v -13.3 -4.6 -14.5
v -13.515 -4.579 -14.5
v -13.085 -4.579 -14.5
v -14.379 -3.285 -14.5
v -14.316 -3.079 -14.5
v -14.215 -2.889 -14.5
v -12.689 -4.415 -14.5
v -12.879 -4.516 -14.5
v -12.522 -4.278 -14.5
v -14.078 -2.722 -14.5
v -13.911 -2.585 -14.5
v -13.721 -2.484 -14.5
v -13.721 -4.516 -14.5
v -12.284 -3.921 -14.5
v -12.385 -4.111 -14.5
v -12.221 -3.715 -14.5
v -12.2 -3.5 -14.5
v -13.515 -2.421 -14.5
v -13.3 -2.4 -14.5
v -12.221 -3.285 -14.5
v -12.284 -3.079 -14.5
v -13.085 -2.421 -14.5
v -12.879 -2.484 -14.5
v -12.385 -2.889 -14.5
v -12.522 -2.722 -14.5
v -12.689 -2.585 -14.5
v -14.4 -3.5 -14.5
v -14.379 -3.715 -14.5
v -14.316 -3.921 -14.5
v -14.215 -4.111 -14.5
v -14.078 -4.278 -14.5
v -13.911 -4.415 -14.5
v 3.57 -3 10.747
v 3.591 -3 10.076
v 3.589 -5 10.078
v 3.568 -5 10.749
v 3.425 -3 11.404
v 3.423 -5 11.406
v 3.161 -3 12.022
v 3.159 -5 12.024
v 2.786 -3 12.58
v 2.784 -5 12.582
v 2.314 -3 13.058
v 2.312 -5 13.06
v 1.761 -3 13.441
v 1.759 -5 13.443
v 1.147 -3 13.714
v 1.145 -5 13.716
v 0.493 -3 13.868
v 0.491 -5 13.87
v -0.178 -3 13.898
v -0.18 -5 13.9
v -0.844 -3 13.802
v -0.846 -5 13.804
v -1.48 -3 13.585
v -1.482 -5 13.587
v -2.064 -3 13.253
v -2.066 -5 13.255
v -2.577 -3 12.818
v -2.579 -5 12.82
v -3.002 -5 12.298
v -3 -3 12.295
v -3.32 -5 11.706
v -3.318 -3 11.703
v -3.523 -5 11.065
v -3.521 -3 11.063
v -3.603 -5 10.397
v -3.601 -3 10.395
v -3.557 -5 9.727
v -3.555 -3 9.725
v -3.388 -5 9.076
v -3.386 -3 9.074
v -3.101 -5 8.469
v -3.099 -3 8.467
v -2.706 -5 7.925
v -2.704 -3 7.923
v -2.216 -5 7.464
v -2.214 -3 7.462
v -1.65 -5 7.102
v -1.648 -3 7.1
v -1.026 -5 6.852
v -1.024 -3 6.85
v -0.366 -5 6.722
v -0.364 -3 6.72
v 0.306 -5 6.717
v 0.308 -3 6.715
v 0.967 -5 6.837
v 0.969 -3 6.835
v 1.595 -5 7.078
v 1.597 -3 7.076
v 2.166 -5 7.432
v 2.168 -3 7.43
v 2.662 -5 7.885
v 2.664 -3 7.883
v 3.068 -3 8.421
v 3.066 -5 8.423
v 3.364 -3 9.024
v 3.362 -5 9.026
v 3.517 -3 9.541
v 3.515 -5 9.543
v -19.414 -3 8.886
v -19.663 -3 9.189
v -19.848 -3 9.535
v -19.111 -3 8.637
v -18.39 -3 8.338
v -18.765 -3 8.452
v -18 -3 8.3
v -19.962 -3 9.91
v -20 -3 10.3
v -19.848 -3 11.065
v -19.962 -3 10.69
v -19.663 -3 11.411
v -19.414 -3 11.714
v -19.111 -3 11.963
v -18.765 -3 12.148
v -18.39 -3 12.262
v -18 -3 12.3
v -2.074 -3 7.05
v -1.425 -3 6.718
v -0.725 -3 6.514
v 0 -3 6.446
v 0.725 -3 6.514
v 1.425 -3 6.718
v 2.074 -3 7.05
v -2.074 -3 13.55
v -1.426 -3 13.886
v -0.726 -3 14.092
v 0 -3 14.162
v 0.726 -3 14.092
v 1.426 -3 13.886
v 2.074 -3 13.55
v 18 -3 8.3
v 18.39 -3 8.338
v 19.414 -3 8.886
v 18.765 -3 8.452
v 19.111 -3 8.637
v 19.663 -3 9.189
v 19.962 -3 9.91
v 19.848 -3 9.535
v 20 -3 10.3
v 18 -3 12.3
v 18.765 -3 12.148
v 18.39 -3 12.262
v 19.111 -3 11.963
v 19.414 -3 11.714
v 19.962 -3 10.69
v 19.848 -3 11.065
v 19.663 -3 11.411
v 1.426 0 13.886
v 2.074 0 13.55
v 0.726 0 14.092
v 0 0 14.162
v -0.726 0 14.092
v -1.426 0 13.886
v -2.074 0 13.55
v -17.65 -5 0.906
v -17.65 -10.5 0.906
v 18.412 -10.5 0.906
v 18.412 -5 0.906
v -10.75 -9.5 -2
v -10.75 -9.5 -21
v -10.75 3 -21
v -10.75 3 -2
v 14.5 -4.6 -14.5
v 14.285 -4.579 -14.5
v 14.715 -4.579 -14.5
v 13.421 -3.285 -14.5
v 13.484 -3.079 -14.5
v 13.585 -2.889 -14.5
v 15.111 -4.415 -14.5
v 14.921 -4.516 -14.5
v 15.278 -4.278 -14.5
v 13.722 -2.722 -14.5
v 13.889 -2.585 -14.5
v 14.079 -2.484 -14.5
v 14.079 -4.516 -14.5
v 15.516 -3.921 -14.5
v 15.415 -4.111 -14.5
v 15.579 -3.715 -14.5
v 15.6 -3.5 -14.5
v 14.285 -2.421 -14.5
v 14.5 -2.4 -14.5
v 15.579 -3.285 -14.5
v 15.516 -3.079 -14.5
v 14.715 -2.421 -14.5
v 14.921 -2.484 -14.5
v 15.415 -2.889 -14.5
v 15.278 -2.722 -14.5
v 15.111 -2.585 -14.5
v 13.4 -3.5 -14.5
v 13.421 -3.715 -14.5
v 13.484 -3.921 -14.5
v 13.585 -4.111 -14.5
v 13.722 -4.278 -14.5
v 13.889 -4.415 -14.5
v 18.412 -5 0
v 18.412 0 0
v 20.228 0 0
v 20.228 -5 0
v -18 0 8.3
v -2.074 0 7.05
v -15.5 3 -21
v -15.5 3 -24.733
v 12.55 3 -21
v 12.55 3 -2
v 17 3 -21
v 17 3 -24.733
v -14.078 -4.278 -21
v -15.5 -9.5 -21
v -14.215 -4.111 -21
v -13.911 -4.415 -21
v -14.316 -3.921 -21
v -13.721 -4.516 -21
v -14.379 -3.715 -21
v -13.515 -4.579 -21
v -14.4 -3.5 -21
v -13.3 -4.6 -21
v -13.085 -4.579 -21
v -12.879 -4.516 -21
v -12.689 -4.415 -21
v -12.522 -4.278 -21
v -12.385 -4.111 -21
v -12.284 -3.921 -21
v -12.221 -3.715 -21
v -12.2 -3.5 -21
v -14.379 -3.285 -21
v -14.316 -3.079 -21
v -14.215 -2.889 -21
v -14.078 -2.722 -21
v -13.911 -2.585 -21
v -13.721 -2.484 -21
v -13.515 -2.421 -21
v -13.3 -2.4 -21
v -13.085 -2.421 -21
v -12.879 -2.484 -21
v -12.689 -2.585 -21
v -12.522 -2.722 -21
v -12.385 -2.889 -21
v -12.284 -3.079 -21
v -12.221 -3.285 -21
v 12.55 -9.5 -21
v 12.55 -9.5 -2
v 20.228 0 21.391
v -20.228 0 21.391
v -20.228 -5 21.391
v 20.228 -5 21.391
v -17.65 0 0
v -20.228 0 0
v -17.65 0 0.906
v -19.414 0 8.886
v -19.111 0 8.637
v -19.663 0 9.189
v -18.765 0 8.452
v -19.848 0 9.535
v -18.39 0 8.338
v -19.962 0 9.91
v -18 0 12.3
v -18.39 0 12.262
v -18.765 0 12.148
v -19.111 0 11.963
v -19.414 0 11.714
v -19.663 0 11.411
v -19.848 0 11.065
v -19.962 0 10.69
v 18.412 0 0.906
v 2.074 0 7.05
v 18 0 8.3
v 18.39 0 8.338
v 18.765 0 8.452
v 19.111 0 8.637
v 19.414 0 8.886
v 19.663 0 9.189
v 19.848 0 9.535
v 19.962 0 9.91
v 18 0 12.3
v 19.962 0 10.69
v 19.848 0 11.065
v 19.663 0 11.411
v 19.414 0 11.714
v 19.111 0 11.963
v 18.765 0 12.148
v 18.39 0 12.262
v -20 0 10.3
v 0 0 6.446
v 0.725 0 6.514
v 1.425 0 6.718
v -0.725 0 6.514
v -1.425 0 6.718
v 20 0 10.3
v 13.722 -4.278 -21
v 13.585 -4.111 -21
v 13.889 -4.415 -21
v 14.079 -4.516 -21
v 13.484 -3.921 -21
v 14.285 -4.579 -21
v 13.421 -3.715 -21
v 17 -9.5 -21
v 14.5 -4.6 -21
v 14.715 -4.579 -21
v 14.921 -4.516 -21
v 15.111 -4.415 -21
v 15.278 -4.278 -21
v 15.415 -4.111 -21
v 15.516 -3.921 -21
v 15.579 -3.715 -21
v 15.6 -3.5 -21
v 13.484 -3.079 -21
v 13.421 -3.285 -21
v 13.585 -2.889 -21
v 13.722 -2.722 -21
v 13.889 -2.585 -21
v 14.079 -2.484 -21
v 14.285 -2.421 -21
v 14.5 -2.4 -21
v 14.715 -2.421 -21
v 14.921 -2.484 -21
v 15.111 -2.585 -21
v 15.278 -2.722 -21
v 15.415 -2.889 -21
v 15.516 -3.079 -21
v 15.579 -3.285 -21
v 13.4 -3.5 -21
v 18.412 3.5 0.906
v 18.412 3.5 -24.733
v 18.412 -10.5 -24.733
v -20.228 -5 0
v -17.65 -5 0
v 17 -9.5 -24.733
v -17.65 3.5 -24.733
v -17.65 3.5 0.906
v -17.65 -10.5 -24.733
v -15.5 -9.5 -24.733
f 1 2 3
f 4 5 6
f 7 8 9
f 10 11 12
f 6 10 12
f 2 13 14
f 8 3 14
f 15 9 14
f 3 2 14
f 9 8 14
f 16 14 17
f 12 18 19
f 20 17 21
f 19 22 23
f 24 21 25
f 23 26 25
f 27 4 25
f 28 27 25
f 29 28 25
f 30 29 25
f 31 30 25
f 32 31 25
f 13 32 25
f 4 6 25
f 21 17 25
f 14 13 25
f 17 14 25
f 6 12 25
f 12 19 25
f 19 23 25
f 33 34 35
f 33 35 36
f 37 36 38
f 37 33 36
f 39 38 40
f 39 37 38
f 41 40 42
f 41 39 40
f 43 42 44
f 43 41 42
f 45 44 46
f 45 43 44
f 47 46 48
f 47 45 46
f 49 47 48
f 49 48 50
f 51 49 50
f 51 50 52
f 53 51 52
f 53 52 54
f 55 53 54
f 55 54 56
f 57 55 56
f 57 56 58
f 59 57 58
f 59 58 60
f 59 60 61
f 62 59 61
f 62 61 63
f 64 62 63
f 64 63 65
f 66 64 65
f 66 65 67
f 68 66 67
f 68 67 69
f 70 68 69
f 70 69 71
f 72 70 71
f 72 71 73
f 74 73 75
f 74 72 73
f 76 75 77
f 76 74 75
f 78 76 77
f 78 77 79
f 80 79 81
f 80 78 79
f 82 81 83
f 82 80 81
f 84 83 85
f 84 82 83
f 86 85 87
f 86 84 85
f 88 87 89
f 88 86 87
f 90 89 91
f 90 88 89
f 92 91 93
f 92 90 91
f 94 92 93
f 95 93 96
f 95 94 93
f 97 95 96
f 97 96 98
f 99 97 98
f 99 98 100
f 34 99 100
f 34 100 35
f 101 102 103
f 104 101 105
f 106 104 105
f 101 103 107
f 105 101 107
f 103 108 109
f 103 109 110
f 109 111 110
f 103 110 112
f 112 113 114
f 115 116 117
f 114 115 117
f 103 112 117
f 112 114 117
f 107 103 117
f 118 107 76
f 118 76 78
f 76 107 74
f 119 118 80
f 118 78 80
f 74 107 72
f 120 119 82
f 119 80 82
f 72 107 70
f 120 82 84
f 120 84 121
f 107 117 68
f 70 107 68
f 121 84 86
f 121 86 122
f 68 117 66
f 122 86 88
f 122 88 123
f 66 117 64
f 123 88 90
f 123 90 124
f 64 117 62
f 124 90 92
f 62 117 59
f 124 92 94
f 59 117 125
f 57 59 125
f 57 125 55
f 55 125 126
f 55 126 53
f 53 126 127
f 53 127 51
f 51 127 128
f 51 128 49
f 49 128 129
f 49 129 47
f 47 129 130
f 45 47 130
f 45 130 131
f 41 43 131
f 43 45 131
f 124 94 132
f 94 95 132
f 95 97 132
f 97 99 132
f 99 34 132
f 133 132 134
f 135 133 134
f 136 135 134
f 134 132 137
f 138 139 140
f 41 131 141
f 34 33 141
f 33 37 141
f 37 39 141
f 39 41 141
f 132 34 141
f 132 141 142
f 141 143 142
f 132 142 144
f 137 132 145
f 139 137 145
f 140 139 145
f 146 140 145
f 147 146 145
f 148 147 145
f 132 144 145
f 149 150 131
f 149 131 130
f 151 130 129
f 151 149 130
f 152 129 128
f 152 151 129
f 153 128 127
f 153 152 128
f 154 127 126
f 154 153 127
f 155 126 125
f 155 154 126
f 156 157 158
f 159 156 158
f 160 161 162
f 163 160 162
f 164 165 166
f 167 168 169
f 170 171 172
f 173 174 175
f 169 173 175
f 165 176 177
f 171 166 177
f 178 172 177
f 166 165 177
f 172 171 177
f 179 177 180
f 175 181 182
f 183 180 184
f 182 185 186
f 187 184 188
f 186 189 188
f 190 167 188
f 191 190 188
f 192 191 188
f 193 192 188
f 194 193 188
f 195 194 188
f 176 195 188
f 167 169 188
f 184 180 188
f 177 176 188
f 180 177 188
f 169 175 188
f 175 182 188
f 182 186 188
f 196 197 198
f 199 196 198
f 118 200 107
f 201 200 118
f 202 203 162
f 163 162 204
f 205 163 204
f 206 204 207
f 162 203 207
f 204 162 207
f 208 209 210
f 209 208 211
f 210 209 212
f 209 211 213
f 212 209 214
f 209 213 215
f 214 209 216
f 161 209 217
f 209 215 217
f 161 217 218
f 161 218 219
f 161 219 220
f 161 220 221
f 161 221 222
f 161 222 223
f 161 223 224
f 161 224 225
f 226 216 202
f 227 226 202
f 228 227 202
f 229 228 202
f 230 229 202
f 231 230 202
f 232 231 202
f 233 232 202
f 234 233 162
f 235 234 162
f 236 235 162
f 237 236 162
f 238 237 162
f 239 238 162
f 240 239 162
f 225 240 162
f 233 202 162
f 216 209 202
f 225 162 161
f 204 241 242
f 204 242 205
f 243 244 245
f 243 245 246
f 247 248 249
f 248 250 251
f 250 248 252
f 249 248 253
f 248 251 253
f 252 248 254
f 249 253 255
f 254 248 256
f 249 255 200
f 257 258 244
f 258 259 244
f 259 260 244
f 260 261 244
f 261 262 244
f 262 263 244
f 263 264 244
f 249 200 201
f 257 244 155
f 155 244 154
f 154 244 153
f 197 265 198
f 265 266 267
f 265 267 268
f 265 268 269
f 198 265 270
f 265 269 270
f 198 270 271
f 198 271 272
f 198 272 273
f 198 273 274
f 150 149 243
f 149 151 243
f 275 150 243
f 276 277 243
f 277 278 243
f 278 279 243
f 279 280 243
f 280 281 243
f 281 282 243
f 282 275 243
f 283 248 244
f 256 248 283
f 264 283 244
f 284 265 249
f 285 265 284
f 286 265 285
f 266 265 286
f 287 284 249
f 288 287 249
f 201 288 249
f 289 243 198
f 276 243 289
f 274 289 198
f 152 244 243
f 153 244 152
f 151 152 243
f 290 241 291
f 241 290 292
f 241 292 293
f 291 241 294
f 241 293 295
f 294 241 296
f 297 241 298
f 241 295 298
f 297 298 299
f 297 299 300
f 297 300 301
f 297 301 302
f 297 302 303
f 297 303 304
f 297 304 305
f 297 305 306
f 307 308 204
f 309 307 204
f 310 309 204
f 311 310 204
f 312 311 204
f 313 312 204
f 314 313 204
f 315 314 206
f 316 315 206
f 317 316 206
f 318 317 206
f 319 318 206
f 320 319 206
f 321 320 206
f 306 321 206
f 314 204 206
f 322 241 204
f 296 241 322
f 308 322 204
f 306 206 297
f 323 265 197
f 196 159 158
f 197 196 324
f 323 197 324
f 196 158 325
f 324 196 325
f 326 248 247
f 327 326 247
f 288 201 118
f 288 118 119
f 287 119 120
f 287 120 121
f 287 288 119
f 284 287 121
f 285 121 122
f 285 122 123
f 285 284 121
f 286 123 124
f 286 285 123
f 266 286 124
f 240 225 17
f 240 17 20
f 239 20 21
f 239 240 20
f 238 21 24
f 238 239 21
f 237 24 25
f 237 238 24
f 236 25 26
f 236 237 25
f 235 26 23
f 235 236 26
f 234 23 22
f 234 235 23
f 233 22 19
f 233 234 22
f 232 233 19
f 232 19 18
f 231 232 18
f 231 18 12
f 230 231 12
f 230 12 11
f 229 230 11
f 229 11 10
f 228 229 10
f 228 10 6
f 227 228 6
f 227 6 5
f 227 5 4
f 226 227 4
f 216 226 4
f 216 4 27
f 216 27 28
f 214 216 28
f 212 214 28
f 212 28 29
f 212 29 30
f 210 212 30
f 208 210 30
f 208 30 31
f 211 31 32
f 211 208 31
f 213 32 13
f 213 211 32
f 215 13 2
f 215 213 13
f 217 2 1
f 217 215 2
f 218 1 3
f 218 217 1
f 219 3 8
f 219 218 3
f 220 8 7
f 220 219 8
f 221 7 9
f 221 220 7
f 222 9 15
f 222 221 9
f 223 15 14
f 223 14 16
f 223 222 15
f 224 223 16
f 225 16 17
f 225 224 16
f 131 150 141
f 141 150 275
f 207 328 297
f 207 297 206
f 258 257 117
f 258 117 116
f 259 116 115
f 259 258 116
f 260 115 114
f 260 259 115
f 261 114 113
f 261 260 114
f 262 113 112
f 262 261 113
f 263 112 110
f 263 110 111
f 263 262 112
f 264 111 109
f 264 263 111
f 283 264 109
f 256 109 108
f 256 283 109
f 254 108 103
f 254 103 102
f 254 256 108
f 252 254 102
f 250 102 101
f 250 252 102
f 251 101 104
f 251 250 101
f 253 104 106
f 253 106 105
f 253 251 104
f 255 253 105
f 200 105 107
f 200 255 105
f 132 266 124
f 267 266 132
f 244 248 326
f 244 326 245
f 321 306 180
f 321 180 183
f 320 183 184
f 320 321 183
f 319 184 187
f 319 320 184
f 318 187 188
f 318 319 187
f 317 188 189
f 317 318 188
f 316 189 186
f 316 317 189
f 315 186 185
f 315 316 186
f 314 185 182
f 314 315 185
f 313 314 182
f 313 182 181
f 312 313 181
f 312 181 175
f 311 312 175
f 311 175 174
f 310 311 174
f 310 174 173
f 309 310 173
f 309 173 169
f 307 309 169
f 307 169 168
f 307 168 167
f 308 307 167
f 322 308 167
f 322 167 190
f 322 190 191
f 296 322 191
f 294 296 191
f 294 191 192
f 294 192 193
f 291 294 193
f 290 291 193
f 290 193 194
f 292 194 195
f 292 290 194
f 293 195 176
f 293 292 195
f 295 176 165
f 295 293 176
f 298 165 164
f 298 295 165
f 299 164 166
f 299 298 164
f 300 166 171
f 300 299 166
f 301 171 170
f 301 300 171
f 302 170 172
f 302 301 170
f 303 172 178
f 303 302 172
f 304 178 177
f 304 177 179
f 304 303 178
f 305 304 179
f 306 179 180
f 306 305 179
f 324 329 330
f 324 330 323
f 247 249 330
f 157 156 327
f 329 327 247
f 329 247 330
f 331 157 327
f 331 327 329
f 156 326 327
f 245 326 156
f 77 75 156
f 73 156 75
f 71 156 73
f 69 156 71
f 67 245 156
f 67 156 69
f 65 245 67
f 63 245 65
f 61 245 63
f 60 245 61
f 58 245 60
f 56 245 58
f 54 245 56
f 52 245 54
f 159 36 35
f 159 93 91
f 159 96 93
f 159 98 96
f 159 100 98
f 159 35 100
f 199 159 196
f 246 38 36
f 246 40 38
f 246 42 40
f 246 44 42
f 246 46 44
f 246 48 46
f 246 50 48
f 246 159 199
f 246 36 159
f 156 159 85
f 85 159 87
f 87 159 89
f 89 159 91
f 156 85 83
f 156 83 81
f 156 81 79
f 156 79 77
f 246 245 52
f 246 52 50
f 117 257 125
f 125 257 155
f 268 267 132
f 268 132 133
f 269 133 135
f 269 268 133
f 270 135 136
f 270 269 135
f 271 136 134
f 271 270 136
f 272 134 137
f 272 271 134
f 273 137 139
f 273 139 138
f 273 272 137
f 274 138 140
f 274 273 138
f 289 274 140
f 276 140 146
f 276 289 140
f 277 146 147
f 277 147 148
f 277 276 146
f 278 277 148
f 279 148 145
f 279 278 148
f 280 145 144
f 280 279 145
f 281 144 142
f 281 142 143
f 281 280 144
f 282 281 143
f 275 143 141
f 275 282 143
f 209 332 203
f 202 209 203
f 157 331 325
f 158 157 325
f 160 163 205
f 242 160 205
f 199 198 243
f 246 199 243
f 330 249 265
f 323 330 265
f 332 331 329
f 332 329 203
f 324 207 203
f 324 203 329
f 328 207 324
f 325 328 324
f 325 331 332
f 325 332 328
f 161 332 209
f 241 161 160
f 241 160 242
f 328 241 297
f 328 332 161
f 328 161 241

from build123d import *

# Parameters (mm, degrees)
CYLINDER023_R               = 3.6
CYLINDER023_DEPTH           = 8
CYLINDER023_ROLL_ANGLE      = 89.941329
CYLINDER023_PITCH_ANGLE     = 3.606623
CYLINDER023_PLACEMENT_ANGLE = -0.059115
PAD031_DEPTH                = 3
SKETCH032_W                 = 40.456886
SKETCH032_H                 = 21.390591
PAD032_DEPTH                = 5
CYLINDER024_R               = 1.1
CYLINDER024_DEPTH           = 10
CYLINDER025_R               = 1.1
CYLINDER025_DEPTH           = 10
SKETCH035_W                 = 23.3
SKETCH035_H                 = 12.5
PAD035_DEPTH                = 19.5
SKETCH033_W                 = 32.5
SKETCH033_H                 = 12.5
PAD034_DEPTH                = 4.5
SKETCH034_W                 = 36.061928
SKETCH034_H                 = 25.639376
PAD033_DEPTH                = 14
CUT030_PLACEMENT_ANGLE      = 90


with BuildPart() as cylinder023:
    # Cylinder023 → Cylinder023 (new body)
    with BuildSketch(Plane.XY):
        Circle(CYLINDER023_R)
    extrude(amount=CYLINDER023_DEPTH)


with BuildPart() as cylinder023_1:
    # Cylinder023 roll: moved
    add(cylinder023.part.rotate(Axis((0, 0, 0), (1, 0, 0)), CYLINDER023_ROLL_ANGLE))


with BuildPart() as cylinder023_2:
    # Cylinder023 pitch: moved
    add(cylinder023_1.part.rotate(Axis((0, 0, 0), (0, 1, 0)), CYLINDER023_PITCH_ANGLE))


with BuildPart() as cylinder023_3:
    # Cylinder023 placement: moved
    add(cylinder023_2.part.moved(Location((21, 34, 6.3))).rotate(Axis((21, 34, 6.3), (0, 0, 1)), CYLINDER023_PLACEMENT_ANGLE))


with BuildPart() as servoagarre011:
    # Sketch031 → Pad031 (new body)
    with BuildSketch(Plane.XZ):
        with BuildLine():
            ThreePointArc((-18.00002, 2), (-20, 0), (-18.00002, -2))
            Line((-18.00002, -2), (-2.073587, -3.25))
            ThreePointArc((-2.073587, -3.25), (0, -3.854383), (2.073587, -3.25))
            Line((2.073587, -3.25), (18.00002, -2))
            ThreePointArc((18.00002, -2), (20, 0), (18.00002, 2))
            Line((2.073587, 3.25), (18.00002, 2))
            ThreePointArc((2.073587, 3.25), (0, 3.862152), (-2.073587, 3.25))
            Line((-18.00002, 2), (-2.073587, 3.25))
        make_face()
    extrude(amount=PAD031_DEPTH)


with BuildPart() as servoagarre011_1:
    # Body034 placement: moved
    add(servoagarre011.part.moved(Location((21, 35, 6.3))))

    # Fusion026: union Cylinder023
    add(cylinder023_3.part)


with BuildPart() as servoagarre011_2:
    # Fusion026 placement: moved
    add(servoagarre011_1.part.moved(Location((-21, -35, 4))))


with BuildPart() as cut027:
    # Sketch032 → Pad032 (new body)
    with BuildSketch(Plane.XZ):
        with Locations((0, 10.695296)):
            Rectangle(SKETCH032_W, SKETCH032_H)
    extrude(amount=PAD032_DEPTH)

    # Cut027: cut ServoAgarre011
    add(servoagarre011_2.part, mode=Mode.SUBTRACT)


with BuildPart() as cylinder024:
    # Cylinder024 → Cylinder024 (new body)
    with BuildSketch(Plane(origin=(30, 22, 6), x_dir=(1, 0, 0), z_dir=(0, -1, 0))):
        Circle(CYLINDER024_R)
    extrude(amount=CYLINDER024_DEPTH)


with BuildPart() as tornillossoporteservohollo005:
    # Cylinder025 → Cylinder025 (new body)
    with BuildSketch(Plane(origin=(2.2, 22, 6), x_dir=(1, 0, 0), z_dir=(0, -1, 0))):
        Circle(CYLINDER025_R)
    extrude(amount=CYLINDER025_DEPTH)

    # Fusion027: union Cylinder024
    add(cylinder024.part)


with BuildPart() as cortecuerpo005:
    # Sketch035 → Pad035 (new body)
    with BuildSketch(Plane.XZ):
        with Locations((16.4, 6.25)):
            Rectangle(SKETCH035_W, SKETCH035_H)
    extrude(amount=PAD035_DEPTH)


with BuildPart() as cortecuerpo005_1:
    # Body038 placement: moved
    add(cortecuerpo005.part.moved(Location((0, 19, 0))))


with BuildPart() as cortetornillos005:
    # Sketch033 → Pad034 (new body)
    with BuildSketch(Plane.XZ):
        with Locations((16.25, 6.25)):
            Rectangle(SKETCH033_W, SKETCH033_H)
    extrude(amount=PAD034_DEPTH)


with BuildPart() as cortetornillos005_1:
    # Body037 placement: moved
    add(cortetornillos005.part.moved(Location((0, 23, 0))))


with BuildPart() as fusion028:
    # Sketch034 → Pad033 (new body)
    with BuildSketch(Plane.XY):
        with Locations((15.881367, 9.413649)):
            Rectangle(SKETCH034_W, SKETCH034_H)
    extrude(amount=PAD033_DEPTH)


with BuildPart() as fusion028_1:
    # Body036 placement: moved
    add(fusion028.part.moved(Location((0, 0, -1))))

    # Cut028: cut CorteTornillos005
    add(cortetornillos005_1.part, mode=Mode.SUBTRACT)

    # Cut029: cut CorteCuerpo005
    add(cortecuerpo005_1.part, mode=Mode.SUBTRACT)

    # Cut030: cut tornillosSoporteServoHollo005
    add(tornillossoporteservohollo005.part, mode=Mode.SUBTRACT)


with BuildPart() as fusion028_2:
    # Cut030 placement: moved
    add(fusion028_1.part.moved(Location((-15.5, -9.5, -2.5))).rotate(Axis((-15.5, -9.5, -2.5), (-1, 0, 0)), CUT030_PLACEMENT_ANGLE))

    # Fusion028: union Cut027
    add(cut027.part)


solid = fusion028_2.part
